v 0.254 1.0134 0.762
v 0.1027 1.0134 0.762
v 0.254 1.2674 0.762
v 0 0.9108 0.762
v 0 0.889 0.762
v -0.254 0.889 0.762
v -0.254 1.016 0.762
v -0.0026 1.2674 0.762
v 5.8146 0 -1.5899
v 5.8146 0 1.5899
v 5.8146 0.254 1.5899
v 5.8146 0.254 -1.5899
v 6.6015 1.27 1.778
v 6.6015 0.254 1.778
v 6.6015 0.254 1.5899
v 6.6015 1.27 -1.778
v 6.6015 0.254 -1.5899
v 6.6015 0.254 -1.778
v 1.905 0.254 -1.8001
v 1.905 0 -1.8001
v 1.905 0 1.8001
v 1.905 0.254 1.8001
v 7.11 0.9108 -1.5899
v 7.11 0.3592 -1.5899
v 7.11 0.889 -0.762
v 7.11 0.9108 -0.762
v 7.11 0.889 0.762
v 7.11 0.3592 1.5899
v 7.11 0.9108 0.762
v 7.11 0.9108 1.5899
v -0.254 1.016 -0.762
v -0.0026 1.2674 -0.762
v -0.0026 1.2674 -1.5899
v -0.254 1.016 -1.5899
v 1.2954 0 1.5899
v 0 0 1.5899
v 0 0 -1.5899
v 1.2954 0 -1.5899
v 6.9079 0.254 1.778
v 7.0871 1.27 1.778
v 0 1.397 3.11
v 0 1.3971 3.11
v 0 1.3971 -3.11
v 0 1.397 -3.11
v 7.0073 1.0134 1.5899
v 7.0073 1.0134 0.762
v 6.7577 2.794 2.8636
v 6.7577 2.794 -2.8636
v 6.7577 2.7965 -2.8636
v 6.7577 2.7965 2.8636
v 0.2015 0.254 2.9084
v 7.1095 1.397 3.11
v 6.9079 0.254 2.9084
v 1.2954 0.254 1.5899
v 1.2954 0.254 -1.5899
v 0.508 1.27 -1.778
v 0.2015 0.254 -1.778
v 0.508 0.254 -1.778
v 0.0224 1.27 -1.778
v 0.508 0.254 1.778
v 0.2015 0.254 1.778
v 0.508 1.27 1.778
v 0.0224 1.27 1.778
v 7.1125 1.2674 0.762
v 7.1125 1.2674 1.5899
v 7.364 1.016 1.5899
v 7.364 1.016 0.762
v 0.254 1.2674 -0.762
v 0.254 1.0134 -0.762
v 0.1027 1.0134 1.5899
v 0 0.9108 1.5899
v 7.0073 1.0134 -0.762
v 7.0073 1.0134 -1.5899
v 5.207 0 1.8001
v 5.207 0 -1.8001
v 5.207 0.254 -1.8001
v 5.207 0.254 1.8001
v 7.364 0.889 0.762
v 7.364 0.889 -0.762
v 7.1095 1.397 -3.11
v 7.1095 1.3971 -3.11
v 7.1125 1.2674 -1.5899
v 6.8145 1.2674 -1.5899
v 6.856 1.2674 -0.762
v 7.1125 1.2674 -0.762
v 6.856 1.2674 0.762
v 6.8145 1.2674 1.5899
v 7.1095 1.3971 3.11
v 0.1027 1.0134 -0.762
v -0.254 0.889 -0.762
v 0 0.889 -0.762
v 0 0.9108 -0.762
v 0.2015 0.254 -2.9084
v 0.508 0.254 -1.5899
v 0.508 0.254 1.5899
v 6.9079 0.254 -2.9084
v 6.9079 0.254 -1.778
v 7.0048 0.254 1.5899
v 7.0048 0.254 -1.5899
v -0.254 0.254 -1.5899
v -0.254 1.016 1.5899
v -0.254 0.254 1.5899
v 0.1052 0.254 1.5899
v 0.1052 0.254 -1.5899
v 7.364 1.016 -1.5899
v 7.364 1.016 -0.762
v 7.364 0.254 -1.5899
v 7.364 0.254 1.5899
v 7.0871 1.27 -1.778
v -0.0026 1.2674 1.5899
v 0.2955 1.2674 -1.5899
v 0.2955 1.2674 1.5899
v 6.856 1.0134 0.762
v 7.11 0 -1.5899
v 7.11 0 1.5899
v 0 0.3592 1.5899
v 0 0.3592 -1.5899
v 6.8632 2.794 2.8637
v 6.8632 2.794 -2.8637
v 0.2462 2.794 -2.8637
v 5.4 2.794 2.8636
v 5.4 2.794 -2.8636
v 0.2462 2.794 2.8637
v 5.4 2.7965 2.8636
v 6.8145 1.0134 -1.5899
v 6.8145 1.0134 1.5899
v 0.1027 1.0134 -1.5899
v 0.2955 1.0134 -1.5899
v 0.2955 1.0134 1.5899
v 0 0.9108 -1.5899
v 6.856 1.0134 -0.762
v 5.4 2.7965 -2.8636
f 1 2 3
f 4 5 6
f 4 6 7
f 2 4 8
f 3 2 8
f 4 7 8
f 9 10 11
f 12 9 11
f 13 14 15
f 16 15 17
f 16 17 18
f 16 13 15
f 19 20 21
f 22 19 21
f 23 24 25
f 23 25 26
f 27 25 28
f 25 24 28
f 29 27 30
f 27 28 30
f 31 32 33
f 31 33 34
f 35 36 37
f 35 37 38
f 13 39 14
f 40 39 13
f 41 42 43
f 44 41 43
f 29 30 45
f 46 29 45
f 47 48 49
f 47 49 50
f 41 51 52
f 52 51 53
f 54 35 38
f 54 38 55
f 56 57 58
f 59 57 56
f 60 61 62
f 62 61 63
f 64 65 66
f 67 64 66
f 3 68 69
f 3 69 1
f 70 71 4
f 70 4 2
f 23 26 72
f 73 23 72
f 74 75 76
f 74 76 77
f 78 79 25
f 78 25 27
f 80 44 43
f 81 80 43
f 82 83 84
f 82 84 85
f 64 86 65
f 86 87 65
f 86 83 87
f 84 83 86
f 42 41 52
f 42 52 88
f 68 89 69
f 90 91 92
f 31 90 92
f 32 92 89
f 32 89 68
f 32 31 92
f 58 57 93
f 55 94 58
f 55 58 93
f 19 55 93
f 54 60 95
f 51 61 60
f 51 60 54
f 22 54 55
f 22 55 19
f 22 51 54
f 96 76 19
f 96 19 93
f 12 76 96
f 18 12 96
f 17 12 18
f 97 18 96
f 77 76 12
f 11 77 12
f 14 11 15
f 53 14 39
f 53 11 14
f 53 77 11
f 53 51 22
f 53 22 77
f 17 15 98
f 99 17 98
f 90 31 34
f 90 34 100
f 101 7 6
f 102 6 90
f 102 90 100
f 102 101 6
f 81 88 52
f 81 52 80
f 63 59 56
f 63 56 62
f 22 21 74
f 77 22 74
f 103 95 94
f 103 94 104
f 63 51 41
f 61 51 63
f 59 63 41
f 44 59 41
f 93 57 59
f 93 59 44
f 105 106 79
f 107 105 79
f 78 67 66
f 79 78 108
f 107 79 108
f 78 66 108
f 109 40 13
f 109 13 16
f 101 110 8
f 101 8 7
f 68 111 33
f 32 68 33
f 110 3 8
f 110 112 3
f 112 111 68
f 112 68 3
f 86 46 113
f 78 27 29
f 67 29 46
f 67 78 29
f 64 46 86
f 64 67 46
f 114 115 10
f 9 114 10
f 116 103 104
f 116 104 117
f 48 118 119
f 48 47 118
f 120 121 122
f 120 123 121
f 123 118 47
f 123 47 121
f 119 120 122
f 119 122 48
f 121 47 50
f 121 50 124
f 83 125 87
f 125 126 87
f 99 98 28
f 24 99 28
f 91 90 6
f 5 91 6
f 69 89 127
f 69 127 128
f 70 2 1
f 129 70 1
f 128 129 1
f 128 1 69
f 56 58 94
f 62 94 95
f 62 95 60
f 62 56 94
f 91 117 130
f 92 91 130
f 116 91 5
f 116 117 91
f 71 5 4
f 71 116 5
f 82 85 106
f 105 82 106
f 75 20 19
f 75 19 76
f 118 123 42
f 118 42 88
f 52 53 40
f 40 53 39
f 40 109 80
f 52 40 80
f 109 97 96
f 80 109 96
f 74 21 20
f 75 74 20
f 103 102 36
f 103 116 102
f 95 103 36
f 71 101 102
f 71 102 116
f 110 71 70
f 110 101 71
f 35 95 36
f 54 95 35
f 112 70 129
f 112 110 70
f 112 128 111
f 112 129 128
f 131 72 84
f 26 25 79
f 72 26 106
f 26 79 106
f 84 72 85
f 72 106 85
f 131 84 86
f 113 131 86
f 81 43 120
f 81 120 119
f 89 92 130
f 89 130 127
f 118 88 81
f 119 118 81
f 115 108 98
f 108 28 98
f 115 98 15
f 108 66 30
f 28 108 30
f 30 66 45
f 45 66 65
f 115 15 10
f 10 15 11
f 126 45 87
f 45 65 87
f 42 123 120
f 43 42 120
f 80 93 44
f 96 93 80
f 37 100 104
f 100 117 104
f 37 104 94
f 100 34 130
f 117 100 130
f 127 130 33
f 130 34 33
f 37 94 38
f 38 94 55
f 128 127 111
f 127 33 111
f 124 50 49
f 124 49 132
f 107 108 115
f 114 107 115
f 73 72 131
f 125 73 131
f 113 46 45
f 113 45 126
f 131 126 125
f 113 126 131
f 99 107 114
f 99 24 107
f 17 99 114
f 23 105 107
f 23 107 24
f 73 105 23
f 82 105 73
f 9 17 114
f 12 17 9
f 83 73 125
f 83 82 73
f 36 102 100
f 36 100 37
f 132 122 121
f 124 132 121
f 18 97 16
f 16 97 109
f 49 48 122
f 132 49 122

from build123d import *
from OCP.BRepFilletAPI import BRepFilletAPI_MakeChamfer

# Parameters (mm, degrees)
SKETCH2_W                = 6.219952
SKETCH2_H                = 2.794
BASE_EXTRUDE_DEPTH       = 7.10946
CHAMFER1_SIZE            = 1.397
CHAMFER1_SIZE2           = 0.246328792
SKETCH3_W                = 3.556
SKETCH3_H                = 1.27
CUT_EXTRUDE1_DEPTH       = 0.508
SKETCH4_W                = 3.556
SKETCH4_H                = 1.27
CUT_EXTRUDE2_DEPTH       = 0.508
SKETCH5_OUTSIDE_W        = 11.079
SKETCH5_OUTSIDE_H        = 10.19
SKETCH5_OUTSIDE_W_2      = 3.302
SKETCH5_OUTSIDE_H_2      = 3.600196
CUT_EXTRUDE3_DEPTH       = 0.254
CHAMFER2_SIZE            = 1.397
CHAMFER2_SIZE_2          = 0.246328792
BOSS_EXTRUDE_THIN1_DEPTH = 1.589913
SKETCH7_W                = 1.524
SKETCH7_H                = 0.381
CUT_EXTRUDE4_DEPTH       = 0.508
SKETCH8_W                = 1.35763
SKETCH8_H                = 5.727294416
BOSS_EXTRUDE2_DEPTH      = 0.00254


with BuildPart() as part:
    # Sketch2 → Base-Extrude (new body)
    with BuildSketch(Plane(origin=(0, 0, 0), x_dir=(0, 0, -1), z_dir=(1, 0, 0))):
        with Locations((0, 1.397)):
            Rectangle(SKETCH2_W, SKETCH2_H)
    extrude(amount=BASE_EXTRUDE_DEPTH)

    # Chamfer1: one chamfer whose edges measure the first distance from different faces: ONE call of the kernel's chamfer builder (chamfer() names one face for all edges)
    chamfer1_edges_1 = [part.edges().sort_by_distance(p)[0] for p in [
        (7.10946, 0, 0),
    ]]
    chamfer1_side_1 = [part.faces().sort_by_distance(p)[0] for p in [
        (7.10946, 1.397, 0),
    ]]
    chamfer1_edges_2 = [part.edges().sort_by_distance(p)[0] for p in [
        (0, 0, 0),
    ]]
    chamfer1_side_2 = [part.faces().sort_by_distance(p)[0] for p in [
        (0, 1.397, 0),
    ]]
    chamfer1_edges_3 = [part.edges().sort_by_distance(p)[0] for p in [
        (3.55473, 0, -3.109976),
    ]]
    chamfer1_side_3 = [part.faces().sort_by_distance(p)[0] for p in [
        (3.55473, 1.397, -3.109976),
    ]]
    chamfer1_edges_4 = [part.edges().sort_by_distance(p)[0] for p in [
        (3.55473, 0, 3.109976),
    ]]
    chamfer1_side_4 = [part.faces().sort_by_distance(p)[0] for p in [
        (3.55473, 1.397, 3.109976),
    ]]
    chamfer1 = BRepFilletAPI_MakeChamfer(part.part.solid().wrapped)
    for e in chamfer1_edges_1:
        chamfer1.Add(CHAMFER1_SIZE, CHAMFER1_SIZE2, e.wrapped, chamfer1_side_1[0].wrapped)  # the first distance lies on this face
    for e in chamfer1_edges_2:
        chamfer1.Add(CHAMFER1_SIZE, CHAMFER1_SIZE2, e.wrapped, chamfer1_side_2[0].wrapped)  # the first distance lies on this face
    for e in chamfer1_edges_3:
        chamfer1.Add(CHAMFER1_SIZE, CHAMFER1_SIZE2, e.wrapped, chamfer1_side_3[0].wrapped)  # the first distance lies on this face
    for e in chamfer1_edges_4:
        chamfer1.Add(CHAMFER1_SIZE, CHAMFER1_SIZE2, e.wrapped, chamfer1_side_4[0].wrapped)  # the first distance lies on this face
    add(Compound.cast(chamfer1.Shape()), mode=Mode.REPLACE)

    # Sketch3 → Cut-Extrude1 (cut)
    with BuildSketch(Plane.ZY):
        with Locations((0, 0.635)):
            Rectangle(SKETCH3_W, SKETCH3_H)
    extrude(amount=-CUT_EXTRUDE1_DEPTH, mode=Mode.SUBTRACT)

    # Sketch4 → Cut-Extrude2 (cut)
    with BuildSketch(Plane(origin=(7.10946, 0, 0), x_dir=(0, 0, -1), z_dir=(1, 0, 0))):
        with Locations((0, 0.635)):
            Rectangle(SKETCH4_W, SKETCH4_H)
    extrude(amount=-CUT_EXTRUDE2_DEPTH, mode=Mode.SUBTRACT)

    # Sketch5 outside → Cut-Extrude3 (cut)
    with BuildSketch(Plane.XZ):
        with Locations((3.5545, 0)):
            Rectangle(SKETCH5_OUTSIDE_W, SKETCH5_OUTSIDE_H)
        with Locations((3.556, 0)):
            Rectangle(SKETCH5_OUTSIDE_W_2, SKETCH5_OUTSIDE_H_2, mode=Mode.SUBTRACT)
    extrude(amount=-CUT_EXTRUDE3_DEPTH, mode=Mode.SUBTRACT)

    # Chamfer2
    chamfer2_edges_1 = [part.edges().sort_by_distance(p)[0] for p in [
        (0, 2.794, 0),
    ]]
    chamfer2_side_1 = [part.faces().sort_by_distance(p)[0] for p in [
        (0, 2.789073424, 0),
    ]]
    chamfer2_edges_2 = [part.edges().sort_by_distance(p)[0] for p in [
        (7.10946, 2.794, 0),
    ]]
    chamfer2_side_2 = [part.faces().sort_by_distance(p)[0] for p in [
        (7.104533424, 2.794, 0),
    ]]
    chamfer2_edges_3 = [part.edges().sort_by_distance(p)[0] for p in [
        (3.55473, 2.794, 3.109976),
    ]]
    chamfer2_side_3 = [part.faces().sort_by_distance(p)[0] for p in [
        (3.55473, 2.789073424, 3.109976),
    ]]
    chamfer2_edges_4 = [part.edges().sort_by_distance(p)[0] for p in [
        (3.55473, 2.794, -3.109976),
    ]]
    chamfer2_side_4 = [part.faces().sort_by_distance(p)[0] for p in [
        (3.55473, 2.794, -3.105049424),
    ]]
    chamfer2 = BRepFilletAPI_MakeChamfer(part.part.solid().wrapped)
    for e in chamfer2_edges_1:
        chamfer2.Add(CHAMFER2_SIZE - 0.0001, CHAMFER2_SIZE_2 - 0.0001, e.wrapped, chamfer2_side_1[0].wrapped)
    for e in chamfer2_edges_2:
        chamfer2.Add(CHAMFER2_SIZE_2 - 0.0001, CHAMFER2_SIZE - 0.0001, e.wrapped, chamfer2_side_2[0].wrapped)
    for e in chamfer2_edges_3:
        chamfer2.Add(CHAMFER2_SIZE - 0.0001, CHAMFER2_SIZE_2 - 0.0001, e.wrapped, chamfer2_side_3[0].wrapped)
    for e in chamfer2_edges_4:
        chamfer2.Add(CHAMFER2_SIZE_2 - 0.0001, CHAMFER2_SIZE - 0.0001, e.wrapped, chamfer2_side_4[0].wrapped)
    add(Compound.cast(chamfer2.Shape()), mode=Mode.REPLACE)  # a hair under: the kernel refuses the full size

    # Sketch6 → Boss-Extrude-Thin1 (add, symmetric)
    with BuildSketch(Plane.XY):
        Polygon((0.295515086, 1.267447171), (-0.002552829, 1.267447171), (-0.254, 1.016), (-0.254, 0.254), (0, 0), (1.2954, 0), (1.2954, 0.254), (0.105210245, 0.254), (0, 0.359210245), (0, 0.910789755), (0.102657416, 1.013447171), (0.295515086, 1.013447171), align=None)
    boss_extrude_thin1 = extrude(amount=BOSS_EXTRUDE_THIN1_DEPTH, both=True)

    # Sketch7 → Cut-Extrude4 (cut)
    with BuildSketch(Plane.ZY.offset(0.254)):
        with Locations((0, 1.0795)):
            Rectangle(SKETCH7_W, SKETCH7_H)
    cut_extrude4 = extrude(amount=-CUT_EXTRUDE4_DEPTH, mode=Mode.SUBTRACT)

    # Mirror1: Boss-Extrude-Thin1, Cut-Extrude4 across plane
    add(boss_extrude_thin1.mirror(Plane(origin=(3.554984, 0, 0), x_dir=(0, 0, 1), z_dir=(1, 0, 0))))
    add(cut_extrude4.mirror(Plane(origin=(3.554984, 0, 0), x_dir=(0, 0, 1), z_dir=(1, 0, 0))), mode=Mode.SUBTRACT)

    # Sketch8 → Boss-Extrude2 (add)
    with BuildSketch(Plane(origin=(0, 2.794, 0), x_dir=(-1, 0, 0), z_dir=(0, 1, 0))):
        with Locations((-6.078855, 0)):
            Rectangle(SKETCH8_W, SKETCH8_H)
    extrude(amount=BOSS_EXTRUDE2_DEPTH)


solid = part.part
